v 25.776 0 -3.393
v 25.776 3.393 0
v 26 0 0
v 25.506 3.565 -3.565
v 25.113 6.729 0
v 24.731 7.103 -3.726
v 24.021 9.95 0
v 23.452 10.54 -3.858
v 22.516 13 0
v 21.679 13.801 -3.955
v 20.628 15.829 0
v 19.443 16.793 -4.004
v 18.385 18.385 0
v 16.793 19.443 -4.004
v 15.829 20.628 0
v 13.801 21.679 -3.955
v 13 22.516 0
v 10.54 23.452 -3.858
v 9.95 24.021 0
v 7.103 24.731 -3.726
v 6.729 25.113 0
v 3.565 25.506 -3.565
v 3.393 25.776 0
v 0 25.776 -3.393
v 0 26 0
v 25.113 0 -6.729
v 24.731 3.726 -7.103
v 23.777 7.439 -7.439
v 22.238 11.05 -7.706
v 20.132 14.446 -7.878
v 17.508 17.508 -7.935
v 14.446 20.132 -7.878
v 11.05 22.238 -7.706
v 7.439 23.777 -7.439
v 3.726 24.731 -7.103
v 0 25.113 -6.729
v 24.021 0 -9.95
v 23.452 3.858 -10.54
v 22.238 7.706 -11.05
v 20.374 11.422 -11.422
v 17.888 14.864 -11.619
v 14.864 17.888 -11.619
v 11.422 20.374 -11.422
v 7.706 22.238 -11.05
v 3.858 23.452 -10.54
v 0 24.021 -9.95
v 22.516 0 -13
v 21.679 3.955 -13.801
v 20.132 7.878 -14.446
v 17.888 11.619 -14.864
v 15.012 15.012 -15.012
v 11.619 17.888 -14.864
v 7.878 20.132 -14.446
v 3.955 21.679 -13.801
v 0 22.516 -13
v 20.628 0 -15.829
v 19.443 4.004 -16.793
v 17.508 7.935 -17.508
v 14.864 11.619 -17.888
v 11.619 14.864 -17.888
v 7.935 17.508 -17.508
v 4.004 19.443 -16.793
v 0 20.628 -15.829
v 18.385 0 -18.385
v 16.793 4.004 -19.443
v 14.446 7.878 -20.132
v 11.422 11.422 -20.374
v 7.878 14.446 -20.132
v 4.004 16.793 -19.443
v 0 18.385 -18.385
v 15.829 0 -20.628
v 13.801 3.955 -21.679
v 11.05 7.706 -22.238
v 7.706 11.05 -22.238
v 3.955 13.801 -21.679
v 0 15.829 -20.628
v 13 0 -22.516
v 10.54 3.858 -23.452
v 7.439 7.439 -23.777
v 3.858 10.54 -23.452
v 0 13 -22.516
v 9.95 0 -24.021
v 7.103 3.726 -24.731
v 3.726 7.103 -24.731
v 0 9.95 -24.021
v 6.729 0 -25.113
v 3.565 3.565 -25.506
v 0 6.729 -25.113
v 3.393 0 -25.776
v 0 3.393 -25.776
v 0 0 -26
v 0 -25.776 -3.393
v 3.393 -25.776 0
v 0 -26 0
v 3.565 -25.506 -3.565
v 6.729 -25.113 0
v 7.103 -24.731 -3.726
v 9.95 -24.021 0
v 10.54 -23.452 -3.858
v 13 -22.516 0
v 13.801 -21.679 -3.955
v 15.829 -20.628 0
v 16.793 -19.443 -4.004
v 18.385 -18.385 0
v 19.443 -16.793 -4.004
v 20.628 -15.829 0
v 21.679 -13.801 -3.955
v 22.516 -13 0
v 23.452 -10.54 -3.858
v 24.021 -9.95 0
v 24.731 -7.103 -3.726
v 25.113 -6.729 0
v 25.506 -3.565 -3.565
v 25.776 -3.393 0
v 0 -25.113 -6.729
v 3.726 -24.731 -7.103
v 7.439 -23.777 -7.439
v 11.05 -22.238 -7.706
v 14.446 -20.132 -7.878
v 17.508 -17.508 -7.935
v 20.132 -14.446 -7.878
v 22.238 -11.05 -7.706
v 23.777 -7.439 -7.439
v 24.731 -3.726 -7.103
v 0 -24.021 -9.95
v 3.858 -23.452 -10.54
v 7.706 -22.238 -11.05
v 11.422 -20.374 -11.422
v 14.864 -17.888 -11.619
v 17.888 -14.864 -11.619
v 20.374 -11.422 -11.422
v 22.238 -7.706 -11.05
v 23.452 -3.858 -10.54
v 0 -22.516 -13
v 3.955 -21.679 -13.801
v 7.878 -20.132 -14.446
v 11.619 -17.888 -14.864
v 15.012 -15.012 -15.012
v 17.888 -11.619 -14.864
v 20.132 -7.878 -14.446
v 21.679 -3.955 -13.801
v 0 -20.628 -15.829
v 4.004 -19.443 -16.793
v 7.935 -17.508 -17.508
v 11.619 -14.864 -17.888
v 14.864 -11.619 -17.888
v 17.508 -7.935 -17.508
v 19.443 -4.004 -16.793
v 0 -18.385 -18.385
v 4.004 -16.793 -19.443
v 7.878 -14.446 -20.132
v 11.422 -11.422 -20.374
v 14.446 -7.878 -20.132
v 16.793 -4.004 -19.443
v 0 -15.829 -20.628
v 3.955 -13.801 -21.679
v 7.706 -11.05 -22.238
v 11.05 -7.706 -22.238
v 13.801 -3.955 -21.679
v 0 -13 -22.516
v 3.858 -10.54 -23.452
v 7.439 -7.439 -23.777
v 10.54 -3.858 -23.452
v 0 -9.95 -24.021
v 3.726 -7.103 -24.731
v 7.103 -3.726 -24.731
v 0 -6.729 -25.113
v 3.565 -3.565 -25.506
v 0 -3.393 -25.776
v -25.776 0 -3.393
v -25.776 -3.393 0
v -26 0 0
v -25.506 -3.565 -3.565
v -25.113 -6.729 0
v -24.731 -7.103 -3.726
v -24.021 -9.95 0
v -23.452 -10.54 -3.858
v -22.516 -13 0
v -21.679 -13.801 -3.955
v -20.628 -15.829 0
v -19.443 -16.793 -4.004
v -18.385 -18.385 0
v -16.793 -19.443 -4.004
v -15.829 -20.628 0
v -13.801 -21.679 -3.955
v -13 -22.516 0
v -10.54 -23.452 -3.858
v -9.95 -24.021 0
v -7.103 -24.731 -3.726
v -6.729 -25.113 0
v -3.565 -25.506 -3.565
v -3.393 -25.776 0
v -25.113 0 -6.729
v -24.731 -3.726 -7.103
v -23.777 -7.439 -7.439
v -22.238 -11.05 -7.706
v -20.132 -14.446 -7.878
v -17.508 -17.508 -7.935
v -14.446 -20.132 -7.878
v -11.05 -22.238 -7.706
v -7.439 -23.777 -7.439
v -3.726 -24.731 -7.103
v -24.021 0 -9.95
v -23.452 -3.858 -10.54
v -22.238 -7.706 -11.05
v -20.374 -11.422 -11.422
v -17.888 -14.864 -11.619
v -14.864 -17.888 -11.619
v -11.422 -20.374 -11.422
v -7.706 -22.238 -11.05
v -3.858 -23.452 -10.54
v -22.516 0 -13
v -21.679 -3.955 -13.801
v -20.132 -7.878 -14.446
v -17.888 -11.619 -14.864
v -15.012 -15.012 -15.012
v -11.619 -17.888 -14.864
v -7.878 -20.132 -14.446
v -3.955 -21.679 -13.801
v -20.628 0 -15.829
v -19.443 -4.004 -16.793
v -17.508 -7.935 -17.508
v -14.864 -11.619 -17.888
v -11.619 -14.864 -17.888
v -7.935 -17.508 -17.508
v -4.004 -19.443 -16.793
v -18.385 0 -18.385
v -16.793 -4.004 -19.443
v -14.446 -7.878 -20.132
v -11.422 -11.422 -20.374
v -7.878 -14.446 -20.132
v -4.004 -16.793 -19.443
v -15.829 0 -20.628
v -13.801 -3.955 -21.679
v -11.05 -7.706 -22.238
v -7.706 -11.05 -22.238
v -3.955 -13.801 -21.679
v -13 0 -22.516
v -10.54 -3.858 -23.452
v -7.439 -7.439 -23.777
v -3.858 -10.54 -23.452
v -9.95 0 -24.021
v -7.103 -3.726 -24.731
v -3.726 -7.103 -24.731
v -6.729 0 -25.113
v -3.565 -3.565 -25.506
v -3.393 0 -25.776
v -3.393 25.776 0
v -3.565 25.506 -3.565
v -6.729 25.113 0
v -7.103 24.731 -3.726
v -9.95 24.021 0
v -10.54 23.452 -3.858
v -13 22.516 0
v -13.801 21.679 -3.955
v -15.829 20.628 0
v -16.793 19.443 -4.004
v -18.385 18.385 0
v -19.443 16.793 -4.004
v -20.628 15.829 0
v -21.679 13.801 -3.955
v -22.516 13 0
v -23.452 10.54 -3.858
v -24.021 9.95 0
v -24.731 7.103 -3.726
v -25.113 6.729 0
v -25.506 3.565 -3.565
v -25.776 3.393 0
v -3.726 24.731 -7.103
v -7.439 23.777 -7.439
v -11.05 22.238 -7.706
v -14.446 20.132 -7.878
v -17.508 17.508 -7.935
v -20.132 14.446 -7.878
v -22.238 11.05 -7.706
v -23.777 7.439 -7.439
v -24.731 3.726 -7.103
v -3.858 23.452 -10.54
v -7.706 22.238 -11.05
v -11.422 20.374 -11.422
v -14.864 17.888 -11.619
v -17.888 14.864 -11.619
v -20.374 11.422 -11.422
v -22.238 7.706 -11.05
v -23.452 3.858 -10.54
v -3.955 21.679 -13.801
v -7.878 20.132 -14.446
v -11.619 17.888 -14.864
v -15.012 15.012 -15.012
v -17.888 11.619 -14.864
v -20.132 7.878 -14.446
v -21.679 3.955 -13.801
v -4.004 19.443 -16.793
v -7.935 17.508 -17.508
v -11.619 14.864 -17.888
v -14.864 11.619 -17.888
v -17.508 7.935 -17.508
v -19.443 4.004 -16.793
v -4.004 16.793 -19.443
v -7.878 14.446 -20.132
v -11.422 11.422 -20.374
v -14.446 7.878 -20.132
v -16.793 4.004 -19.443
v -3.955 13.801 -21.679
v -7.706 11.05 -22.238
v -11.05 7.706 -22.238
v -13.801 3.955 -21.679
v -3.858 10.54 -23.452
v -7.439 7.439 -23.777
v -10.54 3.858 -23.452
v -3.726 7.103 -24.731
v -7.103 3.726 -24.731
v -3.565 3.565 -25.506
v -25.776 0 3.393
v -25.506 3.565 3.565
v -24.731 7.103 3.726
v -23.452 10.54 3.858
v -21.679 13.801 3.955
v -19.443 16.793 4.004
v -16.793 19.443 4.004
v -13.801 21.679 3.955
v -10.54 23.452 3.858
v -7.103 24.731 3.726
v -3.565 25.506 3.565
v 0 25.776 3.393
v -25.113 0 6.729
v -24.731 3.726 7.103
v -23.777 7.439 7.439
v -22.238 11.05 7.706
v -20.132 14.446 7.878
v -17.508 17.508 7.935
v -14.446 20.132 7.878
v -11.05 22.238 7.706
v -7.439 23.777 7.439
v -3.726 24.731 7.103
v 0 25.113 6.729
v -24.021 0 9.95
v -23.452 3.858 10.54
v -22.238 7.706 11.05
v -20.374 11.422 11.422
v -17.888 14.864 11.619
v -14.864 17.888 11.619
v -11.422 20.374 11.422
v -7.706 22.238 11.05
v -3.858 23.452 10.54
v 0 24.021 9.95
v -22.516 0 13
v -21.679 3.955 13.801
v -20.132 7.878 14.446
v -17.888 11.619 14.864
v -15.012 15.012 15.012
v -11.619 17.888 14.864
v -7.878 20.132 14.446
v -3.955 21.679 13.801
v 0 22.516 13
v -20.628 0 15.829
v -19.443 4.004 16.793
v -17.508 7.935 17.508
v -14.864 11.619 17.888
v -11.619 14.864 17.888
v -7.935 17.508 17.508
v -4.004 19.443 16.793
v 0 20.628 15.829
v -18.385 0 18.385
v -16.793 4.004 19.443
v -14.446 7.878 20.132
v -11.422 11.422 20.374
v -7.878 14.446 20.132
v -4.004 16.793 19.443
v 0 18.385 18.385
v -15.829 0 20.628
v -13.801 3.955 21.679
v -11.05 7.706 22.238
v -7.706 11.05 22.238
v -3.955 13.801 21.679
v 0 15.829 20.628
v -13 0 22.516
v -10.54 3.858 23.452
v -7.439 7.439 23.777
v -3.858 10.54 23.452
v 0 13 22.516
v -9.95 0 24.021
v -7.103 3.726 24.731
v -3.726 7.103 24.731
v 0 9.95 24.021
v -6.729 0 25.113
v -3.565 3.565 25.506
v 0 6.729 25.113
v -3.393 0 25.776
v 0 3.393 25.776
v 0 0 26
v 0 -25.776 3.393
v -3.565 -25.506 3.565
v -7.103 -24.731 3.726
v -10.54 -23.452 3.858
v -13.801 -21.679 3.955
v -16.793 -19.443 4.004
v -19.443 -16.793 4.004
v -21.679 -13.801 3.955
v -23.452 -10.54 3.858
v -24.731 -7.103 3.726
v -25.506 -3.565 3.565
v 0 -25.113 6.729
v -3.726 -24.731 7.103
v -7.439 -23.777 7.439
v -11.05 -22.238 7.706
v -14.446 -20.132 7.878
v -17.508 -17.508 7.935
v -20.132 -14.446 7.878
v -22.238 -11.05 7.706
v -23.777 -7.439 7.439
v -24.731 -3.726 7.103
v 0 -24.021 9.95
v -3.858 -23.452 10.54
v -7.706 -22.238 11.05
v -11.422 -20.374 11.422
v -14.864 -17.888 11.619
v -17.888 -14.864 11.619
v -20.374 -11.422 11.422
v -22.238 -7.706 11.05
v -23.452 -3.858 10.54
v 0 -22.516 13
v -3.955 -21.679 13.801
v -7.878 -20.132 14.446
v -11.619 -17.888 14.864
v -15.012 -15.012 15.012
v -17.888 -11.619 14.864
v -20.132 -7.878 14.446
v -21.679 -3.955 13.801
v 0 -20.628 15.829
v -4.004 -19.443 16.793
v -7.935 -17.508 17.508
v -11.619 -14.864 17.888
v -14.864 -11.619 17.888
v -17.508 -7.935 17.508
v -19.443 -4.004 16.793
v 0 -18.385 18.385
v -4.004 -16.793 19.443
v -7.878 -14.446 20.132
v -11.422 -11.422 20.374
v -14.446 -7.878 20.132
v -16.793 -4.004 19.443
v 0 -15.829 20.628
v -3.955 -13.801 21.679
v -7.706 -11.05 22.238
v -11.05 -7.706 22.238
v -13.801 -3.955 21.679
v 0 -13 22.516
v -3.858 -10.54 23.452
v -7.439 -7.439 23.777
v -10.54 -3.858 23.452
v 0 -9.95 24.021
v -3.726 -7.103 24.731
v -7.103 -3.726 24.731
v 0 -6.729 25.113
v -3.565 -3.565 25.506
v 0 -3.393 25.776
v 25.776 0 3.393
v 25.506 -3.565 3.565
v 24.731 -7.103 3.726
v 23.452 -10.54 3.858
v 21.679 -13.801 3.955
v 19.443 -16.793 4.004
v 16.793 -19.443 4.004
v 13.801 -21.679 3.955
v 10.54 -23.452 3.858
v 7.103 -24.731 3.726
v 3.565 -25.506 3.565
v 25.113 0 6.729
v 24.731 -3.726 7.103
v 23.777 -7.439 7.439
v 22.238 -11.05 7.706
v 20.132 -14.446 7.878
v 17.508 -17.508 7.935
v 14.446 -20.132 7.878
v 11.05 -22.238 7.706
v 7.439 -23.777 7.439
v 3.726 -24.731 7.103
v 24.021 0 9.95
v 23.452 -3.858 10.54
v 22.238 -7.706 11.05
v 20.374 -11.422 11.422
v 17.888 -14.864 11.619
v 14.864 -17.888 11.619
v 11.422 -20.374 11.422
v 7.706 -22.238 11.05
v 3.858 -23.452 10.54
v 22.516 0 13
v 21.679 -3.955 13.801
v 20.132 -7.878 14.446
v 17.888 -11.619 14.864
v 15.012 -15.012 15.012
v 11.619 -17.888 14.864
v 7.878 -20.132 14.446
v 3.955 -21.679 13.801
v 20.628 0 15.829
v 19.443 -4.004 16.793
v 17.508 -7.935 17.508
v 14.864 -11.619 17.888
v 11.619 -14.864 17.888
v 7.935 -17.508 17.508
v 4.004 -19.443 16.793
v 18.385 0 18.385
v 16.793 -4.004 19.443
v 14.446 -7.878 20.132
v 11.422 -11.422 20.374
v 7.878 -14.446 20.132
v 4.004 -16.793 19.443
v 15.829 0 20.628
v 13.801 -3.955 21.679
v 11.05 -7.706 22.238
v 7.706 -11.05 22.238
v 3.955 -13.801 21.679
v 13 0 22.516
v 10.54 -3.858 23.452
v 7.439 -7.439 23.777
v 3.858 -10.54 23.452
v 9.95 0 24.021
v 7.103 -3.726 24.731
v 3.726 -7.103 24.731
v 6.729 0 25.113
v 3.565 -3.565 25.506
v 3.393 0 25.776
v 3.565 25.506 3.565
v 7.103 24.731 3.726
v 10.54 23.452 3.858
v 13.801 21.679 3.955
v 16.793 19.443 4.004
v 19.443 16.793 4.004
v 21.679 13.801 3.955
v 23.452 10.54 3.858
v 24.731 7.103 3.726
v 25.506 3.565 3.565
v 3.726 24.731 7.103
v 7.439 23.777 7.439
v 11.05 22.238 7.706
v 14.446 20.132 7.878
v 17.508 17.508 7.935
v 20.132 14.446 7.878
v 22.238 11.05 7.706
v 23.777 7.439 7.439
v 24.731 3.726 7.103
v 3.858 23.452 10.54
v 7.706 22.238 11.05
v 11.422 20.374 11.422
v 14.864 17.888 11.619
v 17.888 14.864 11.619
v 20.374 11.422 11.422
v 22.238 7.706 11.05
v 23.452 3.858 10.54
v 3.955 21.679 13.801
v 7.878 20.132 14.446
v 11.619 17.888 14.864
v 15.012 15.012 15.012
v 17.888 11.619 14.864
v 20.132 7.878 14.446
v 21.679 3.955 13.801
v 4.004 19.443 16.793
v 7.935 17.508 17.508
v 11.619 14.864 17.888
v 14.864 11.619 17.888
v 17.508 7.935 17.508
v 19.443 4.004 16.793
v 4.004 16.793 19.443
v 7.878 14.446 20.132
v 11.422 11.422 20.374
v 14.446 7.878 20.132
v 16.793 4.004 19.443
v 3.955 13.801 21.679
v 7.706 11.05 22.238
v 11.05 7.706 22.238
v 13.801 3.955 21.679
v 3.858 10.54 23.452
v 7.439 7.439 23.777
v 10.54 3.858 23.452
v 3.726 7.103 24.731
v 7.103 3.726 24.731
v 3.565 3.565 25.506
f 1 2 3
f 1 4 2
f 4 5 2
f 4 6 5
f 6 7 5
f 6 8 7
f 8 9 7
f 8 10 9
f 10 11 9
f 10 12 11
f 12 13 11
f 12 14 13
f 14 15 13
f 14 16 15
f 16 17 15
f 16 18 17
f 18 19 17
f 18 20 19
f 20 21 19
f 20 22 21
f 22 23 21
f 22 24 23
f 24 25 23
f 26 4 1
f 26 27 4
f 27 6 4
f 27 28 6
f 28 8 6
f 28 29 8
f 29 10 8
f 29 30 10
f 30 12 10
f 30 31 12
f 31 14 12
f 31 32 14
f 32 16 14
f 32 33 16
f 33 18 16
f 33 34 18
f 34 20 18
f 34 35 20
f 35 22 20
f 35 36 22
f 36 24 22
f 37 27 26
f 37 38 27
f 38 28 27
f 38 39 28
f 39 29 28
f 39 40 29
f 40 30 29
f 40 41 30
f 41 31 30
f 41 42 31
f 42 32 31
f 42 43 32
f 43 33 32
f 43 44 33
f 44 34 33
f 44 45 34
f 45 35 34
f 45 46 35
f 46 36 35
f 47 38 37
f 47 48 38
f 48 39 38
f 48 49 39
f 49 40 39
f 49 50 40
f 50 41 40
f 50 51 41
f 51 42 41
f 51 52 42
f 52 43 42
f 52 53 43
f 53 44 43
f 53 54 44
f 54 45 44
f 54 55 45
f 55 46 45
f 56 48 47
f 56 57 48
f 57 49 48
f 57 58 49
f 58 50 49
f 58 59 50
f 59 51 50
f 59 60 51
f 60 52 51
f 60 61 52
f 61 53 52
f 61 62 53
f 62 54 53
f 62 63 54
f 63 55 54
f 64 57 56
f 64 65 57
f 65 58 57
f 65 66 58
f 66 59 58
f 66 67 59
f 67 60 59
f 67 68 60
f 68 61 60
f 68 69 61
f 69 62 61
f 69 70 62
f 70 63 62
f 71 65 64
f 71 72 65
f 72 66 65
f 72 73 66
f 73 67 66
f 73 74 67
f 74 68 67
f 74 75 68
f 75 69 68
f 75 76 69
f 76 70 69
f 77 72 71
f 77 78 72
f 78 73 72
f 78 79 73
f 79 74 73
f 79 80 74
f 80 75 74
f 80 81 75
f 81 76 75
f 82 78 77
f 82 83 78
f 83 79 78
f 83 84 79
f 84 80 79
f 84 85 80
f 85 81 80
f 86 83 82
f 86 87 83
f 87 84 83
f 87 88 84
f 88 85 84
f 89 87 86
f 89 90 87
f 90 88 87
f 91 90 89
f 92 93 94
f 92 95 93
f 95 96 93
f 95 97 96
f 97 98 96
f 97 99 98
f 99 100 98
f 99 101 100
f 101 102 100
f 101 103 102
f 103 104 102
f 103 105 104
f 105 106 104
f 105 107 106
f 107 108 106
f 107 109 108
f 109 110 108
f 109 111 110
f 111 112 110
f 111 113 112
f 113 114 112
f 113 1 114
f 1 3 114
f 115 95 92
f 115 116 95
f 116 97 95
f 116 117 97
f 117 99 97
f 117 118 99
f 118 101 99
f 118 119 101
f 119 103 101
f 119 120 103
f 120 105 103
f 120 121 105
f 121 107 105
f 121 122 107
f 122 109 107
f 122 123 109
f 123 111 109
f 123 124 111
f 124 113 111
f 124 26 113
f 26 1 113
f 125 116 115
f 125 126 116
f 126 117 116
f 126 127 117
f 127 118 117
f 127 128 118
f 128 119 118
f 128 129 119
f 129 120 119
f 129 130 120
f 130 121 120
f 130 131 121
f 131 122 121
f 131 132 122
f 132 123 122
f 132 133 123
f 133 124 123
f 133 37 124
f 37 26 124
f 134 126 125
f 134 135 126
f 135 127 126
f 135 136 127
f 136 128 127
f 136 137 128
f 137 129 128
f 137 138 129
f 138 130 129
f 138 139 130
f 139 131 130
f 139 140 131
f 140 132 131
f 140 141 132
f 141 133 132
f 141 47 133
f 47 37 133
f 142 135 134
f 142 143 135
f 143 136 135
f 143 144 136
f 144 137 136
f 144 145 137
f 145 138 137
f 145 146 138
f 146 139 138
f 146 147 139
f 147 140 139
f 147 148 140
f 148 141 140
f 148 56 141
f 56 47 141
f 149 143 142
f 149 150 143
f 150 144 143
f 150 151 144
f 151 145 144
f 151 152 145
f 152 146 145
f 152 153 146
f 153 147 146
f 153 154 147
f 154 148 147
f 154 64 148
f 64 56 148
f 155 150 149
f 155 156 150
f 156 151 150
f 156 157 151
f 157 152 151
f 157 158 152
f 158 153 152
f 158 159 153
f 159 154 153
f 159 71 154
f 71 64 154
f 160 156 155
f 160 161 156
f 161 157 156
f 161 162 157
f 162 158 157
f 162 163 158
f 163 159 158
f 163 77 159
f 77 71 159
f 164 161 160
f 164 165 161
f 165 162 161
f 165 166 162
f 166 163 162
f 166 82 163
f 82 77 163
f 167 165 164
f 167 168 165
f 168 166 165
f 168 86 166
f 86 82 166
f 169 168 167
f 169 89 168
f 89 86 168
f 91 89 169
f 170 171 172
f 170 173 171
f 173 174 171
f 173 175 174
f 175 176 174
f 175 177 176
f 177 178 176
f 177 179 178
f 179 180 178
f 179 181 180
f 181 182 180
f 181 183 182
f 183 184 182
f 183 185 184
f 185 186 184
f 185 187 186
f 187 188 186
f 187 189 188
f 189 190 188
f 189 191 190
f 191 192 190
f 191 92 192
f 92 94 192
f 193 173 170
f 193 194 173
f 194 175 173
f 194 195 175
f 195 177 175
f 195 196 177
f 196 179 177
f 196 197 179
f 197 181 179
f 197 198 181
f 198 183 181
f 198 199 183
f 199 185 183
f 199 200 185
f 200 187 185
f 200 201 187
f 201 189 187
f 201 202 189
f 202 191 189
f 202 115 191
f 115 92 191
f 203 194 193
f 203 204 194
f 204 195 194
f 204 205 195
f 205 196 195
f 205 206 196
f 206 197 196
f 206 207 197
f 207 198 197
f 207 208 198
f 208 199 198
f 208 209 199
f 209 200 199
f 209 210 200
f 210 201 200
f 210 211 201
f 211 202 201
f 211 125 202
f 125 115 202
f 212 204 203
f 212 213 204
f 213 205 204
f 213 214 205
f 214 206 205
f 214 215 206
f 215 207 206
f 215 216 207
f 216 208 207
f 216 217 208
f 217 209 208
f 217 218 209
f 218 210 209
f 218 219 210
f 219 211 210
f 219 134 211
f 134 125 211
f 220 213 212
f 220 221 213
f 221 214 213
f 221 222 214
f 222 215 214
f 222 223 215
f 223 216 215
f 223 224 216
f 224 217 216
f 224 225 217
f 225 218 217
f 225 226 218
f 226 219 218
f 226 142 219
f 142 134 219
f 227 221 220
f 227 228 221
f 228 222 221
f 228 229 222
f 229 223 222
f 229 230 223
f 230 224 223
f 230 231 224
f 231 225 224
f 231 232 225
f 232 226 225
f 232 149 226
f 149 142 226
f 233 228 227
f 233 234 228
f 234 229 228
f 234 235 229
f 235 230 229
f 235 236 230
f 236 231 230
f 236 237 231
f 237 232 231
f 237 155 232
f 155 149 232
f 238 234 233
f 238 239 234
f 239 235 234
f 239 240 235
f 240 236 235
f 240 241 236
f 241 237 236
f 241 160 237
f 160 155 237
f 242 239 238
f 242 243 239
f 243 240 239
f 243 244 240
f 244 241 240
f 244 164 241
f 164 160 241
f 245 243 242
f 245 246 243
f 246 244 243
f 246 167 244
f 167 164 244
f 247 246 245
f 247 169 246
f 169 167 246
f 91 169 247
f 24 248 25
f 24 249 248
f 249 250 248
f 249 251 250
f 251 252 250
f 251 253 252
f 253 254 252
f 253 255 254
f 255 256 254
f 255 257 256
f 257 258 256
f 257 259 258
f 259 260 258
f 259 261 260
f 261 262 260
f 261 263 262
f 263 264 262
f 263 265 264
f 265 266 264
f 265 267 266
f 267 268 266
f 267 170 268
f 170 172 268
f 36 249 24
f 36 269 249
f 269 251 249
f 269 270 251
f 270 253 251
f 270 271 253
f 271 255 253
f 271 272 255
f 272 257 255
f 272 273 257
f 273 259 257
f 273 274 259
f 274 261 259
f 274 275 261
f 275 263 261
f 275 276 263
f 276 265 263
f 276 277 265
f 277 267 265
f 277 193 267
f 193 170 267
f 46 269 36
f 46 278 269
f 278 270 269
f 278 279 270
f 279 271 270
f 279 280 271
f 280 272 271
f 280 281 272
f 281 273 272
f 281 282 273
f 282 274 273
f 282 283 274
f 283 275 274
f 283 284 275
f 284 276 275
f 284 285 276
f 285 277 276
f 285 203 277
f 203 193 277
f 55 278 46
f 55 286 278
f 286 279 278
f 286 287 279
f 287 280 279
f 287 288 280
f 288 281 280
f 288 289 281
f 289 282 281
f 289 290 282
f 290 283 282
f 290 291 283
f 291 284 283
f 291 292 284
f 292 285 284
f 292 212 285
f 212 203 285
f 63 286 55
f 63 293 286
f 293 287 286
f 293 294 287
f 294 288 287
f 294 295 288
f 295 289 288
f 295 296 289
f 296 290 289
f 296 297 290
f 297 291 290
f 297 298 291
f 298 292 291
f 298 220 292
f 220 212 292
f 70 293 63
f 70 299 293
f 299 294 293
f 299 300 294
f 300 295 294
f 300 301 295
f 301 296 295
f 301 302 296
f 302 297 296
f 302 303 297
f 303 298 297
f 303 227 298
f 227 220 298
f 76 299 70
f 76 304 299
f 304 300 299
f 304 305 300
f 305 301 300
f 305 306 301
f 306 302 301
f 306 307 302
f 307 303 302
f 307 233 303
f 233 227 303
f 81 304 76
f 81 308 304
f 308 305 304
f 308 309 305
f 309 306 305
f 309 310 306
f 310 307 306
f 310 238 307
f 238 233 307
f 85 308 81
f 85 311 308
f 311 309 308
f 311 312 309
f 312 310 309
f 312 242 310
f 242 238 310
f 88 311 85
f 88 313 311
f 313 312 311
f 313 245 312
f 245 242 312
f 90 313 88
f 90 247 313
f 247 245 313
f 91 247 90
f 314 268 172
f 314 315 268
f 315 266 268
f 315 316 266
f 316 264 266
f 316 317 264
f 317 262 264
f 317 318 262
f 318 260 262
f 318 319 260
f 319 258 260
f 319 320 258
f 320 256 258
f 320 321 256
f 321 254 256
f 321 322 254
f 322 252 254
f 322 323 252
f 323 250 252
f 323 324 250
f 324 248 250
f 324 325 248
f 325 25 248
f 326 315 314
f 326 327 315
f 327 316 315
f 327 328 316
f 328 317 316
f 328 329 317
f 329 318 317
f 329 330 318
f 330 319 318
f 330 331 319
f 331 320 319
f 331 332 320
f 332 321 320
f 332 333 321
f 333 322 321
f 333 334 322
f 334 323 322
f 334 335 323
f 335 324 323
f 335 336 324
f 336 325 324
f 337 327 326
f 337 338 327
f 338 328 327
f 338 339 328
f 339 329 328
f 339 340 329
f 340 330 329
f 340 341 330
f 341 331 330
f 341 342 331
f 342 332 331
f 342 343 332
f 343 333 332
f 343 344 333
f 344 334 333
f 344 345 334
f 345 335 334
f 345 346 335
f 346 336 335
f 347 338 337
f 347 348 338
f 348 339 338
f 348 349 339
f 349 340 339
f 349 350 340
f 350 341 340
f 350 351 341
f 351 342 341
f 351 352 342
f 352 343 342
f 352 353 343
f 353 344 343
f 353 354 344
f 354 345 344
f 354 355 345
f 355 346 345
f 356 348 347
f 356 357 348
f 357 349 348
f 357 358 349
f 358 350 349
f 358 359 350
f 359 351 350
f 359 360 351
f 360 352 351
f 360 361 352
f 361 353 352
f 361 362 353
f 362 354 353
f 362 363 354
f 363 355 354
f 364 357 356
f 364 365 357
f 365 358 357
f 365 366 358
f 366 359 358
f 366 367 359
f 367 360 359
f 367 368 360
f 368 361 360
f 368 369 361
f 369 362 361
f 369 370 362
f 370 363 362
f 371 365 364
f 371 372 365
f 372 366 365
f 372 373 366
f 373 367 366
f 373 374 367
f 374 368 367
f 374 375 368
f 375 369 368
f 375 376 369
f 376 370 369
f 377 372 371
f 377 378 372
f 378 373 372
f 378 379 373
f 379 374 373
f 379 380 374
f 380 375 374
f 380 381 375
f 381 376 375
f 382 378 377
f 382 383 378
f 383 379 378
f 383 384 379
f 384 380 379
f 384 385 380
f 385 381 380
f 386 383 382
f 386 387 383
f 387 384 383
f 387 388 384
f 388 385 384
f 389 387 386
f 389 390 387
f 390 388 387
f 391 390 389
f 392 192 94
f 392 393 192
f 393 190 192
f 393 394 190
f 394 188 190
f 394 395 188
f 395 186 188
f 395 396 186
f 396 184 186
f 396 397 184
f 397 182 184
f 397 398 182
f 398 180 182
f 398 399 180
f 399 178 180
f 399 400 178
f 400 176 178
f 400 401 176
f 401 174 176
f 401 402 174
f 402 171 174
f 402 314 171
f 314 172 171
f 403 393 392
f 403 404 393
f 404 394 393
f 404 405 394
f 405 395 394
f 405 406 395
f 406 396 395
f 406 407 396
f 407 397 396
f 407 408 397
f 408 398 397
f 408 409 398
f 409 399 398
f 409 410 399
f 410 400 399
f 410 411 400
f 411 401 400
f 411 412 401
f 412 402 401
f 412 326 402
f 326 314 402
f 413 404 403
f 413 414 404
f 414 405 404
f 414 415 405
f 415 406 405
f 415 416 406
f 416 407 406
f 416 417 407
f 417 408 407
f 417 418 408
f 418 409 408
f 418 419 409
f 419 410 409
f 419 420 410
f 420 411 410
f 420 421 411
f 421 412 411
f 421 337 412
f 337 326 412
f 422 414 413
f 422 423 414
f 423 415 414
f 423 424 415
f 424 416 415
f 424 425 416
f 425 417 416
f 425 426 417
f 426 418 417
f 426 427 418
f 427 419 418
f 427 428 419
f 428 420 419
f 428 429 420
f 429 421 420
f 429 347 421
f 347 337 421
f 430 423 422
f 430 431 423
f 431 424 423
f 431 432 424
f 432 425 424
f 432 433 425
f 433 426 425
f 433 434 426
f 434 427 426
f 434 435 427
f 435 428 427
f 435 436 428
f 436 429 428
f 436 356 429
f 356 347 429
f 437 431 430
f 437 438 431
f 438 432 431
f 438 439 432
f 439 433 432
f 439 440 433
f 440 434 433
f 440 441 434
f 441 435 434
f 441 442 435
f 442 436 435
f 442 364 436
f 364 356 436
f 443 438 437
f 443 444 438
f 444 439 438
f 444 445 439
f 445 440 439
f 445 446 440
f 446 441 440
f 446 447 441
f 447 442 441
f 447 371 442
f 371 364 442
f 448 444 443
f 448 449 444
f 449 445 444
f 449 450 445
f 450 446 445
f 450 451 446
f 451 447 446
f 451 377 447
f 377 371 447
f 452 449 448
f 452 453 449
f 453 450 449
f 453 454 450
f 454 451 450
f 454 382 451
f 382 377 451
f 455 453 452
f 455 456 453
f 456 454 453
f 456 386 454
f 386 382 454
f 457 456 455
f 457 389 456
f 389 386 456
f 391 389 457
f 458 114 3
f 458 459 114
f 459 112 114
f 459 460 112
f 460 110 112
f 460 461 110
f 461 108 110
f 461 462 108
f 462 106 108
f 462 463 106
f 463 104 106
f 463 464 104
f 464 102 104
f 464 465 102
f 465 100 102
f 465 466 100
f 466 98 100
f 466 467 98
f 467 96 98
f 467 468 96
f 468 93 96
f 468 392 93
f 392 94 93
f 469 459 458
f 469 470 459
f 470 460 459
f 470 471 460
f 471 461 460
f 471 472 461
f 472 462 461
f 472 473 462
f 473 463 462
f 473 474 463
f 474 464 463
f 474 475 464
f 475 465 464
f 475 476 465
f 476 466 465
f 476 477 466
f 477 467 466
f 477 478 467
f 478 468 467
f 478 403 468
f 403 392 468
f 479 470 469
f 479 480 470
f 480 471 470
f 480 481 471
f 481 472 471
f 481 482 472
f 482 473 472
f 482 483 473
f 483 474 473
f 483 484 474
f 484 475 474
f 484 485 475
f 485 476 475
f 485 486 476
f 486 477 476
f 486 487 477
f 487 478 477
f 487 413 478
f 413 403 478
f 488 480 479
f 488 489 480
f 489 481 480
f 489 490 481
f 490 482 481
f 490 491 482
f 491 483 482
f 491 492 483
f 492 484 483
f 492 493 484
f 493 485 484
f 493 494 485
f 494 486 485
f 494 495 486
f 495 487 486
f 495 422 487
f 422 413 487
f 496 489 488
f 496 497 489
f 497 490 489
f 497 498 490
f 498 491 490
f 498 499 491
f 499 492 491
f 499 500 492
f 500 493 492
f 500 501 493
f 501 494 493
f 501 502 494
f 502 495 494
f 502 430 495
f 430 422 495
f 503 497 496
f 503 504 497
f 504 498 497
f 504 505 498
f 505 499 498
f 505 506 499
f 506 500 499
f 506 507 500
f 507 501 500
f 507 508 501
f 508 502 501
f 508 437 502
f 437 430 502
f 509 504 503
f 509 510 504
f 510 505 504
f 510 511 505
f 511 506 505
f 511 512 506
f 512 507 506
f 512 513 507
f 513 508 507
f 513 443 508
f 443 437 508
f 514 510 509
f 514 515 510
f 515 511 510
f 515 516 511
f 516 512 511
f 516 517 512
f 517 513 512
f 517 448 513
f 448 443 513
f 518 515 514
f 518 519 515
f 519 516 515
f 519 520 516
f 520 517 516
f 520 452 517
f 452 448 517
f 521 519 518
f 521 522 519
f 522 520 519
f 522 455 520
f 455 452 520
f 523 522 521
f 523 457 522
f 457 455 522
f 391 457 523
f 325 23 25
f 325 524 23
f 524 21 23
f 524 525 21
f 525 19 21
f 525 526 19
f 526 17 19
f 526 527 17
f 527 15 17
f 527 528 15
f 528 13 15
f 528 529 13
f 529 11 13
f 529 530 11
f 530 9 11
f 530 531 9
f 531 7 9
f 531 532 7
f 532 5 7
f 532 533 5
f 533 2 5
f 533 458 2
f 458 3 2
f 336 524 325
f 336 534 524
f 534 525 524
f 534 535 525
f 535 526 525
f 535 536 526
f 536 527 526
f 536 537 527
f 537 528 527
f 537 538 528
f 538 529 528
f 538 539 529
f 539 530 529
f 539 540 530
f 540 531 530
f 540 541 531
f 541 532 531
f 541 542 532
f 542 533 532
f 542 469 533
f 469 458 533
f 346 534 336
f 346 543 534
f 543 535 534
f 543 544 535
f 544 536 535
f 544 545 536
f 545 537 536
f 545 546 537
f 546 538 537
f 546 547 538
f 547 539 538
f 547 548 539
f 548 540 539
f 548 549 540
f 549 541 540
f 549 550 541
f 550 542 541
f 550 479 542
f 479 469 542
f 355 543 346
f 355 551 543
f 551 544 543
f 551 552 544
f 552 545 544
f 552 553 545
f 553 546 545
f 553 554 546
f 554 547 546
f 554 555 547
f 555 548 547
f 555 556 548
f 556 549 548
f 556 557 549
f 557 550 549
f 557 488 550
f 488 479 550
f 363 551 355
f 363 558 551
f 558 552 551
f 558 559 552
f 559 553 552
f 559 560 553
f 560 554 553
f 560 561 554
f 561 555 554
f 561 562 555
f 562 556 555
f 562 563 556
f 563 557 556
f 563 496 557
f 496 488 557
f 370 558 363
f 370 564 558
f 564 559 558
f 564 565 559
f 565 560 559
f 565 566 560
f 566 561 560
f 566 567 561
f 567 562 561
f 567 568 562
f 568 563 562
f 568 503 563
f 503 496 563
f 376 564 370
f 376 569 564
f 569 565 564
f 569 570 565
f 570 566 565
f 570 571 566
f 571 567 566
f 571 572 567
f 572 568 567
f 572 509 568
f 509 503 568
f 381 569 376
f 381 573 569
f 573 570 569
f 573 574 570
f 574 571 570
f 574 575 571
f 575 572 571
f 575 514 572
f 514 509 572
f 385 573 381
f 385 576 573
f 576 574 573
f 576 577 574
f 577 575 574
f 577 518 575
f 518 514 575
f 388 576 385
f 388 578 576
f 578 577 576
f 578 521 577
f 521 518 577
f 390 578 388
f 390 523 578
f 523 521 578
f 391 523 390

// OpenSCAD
// file: ../p/48/8-8sphe.scad
use <../../lib.scad>
use <1-8sphe.scad>
function ldraw_lib__48__8_8sphe() = [
// 0 Hi-Res Sphere 1.0
// 0 Name: 48\8-8sphe.dat
// 0 Author: Steve Bliss [sbliss]
// 0 !LDRAW_ORG 48_Primitive UPDATE 2012-01
// 0 !LICENSE Licensed under CC BY 4.0 : see CAreadme.txt
// 
// 0 BFC CERTIFY CCW
  [0,"BFC","CERTIFY"],
  [0,"BFC","CCW"],
// 
// 0 !HISTORY 2012-03-30 [PTadmin] Official Update 2012-01
// 
// 
// 1 16 0 0 0 1 0 0 0 1 0 0 0 1 48\1-8sphe.dat
  [1,16,0,0,0,1,0,0,0,1,0,0,0,1, ldraw_lib__48__1_8sphe()],
// 1 16 0 0 0 0 0 1 0 1 0 -1 0 0 48\1-8sphe.dat
  [1,16,0,0,0,0,0,1,0,1,0,-1,0,0, ldraw_lib__48__1_8sphe()],
// 1 16 0 0 0 -1 0 0 0 1 0 0 0 -1 48\1-8sphe.dat
  [1,16,0,0,0,-1,0,0,0,1,0,0,0,-1, ldraw_lib__48__1_8sphe()],
// 1 16 0 0 0 0 0 -1 0 1 0 1 0 0 48\1-8sphe.dat
  [1,16,0,0,0,0,0,-1,0,1,0,1,0,0, ldraw_lib__48__1_8sphe()],
// 1 16 0 0 0 -1 0 0 0 -1 0 0 0 1 48\1-8sphe.dat
  [1,16,0,0,0,-1,0,0,0,-1,0,0,0,1, ldraw_lib__48__1_8sphe()],
// 1 16 0 0 0 0 0 -1 0 -1 0 -1 0 0 48\1-8sphe.dat
  [1,16,0,0,0,0,0,-1,0,-1,0,-1,0,0, ldraw_lib__48__1_8sphe()],
// 1 16 0 0 0 1 0 0 0 -1 0 0 0 -1 48\1-8sphe.dat
  [1,16,0,0,0,1,0,0,0,-1,0,0,0,-1, ldraw_lib__48__1_8sphe()],
// 1 16 0 0 0 0 0 1 0 -1 0 1 0 0 48\1-8sphe.dat
  [1,16,0,0,0,0,0,1,0,-1,0,1,0,0, ldraw_lib__48__1_8sphe()],
// 0
];
module ldraw_lib__48__8_8sphe(step=0, col=false, unit=2/5, alt=false, line=0.2, solid=!$preview)
    makepoly(ldraw_lib__48__8_8sphe(), step=step, col=col, unit=unit, alt=alt, line=line, solid=solid);
ldraw_lib__48__8_8sphe(line=0.2);
// file: 22119.scad
use <../lib.scad>
use <../p/48/8-8sphe.scad>
function ldraw_lib__22119() = [
// 0 Ball 52mm Diameter
// 0 Name: 22119.dat
// 0 Author: Philippe Hurbain [Philo]
// 0 !LDRAW_ORG Part UPDATE 2012-01
// 0 !LICENSE Licensed under CC BY 4.0 : see CAreadme.txt
// 
// 0 BFC CERTIFY CCW
  [0,"BFC","CERTIFY"],
  [0,"BFC","CCW"],
// 
// 0 !CATEGORY Sphere
// 0 !KEYWORDS BrickLink 41250, Rebrickable 41250
// 
// 0 !HISTORY 2012-03-30 [PTadmin] Official Update 2012-01
// 
// 
// 1 16 0 0 0 65 0 0 0 65 0 0 0 65 48\8-8sphe.dat
  [1,16,0,0,0,65,0,0,0,65,0,0,0,65, ldraw_lib__48__8_8sphe()],
// 0
];
module ldraw_lib__22119(step=0, col=false, unit=2/5, alt=false, line=0.2, solid=!$preview)
    makepoly(ldraw_lib__22119(), step=step, col=col, unit=unit, alt=alt, line=line, solid=solid);
ldraw_lib__22119(line=0.2);
// main file
use <../lib.scad>
use <22119.scad>
function ldraw_lib__51930() = [
// 0 =Ball 52mm Diameter
// 0 Name: 51930.dat
// 0 Author: [PTadmin]
// 0 !LDRAW_ORG Part Alias UPDATE 2025-09
// 0 !LICENSE Licensed under CC BY 4.0 : see CAreadme.txt
// 
// 0 BFC CERTIFY CCW
  [0,"BFC","CERTIFY"],
  [0,"BFC","CCW"],
// 
// 0 !CATEGORY Sphere
// 0 !KEYWORDS BrickLink 41250, Rebrickable 41250
// 
// 0 !HISTORY 2012-03-30 [PTadmin] Official Update 2012-01
// 0 !HISTORY 2013-12-14 [cwdee] Add = prefix
// 0 !HISTORY 2013-12-23 [PTadmin] Official Update 2013-02
// 0 !HISTORY 2025-09-27 [OrionP] Changed winding to CCW
// 0 !HISTORY 2025-09-29 [OrionP] Official Update 2025-09
// 
// 0 // Alias of 22119
// 
// 1 16 0 0 0 1 0 0 0 1 0 0 0 1 22119.dat
  [1,16,0,0,0,1,0,0,0,1,0,0,0,1, ldraw_lib__22119()],
// 0
];
module ldraw_lib__51930(step=0, col=false, unit=2/5, alt=false, line=0.2, solid=!$preview)
    makepoly(ldraw_lib__51930(), step=step, col=col, unit=unit, alt=alt, line=line, solid=solid);
ldraw_lib__51930(line=0.2);
